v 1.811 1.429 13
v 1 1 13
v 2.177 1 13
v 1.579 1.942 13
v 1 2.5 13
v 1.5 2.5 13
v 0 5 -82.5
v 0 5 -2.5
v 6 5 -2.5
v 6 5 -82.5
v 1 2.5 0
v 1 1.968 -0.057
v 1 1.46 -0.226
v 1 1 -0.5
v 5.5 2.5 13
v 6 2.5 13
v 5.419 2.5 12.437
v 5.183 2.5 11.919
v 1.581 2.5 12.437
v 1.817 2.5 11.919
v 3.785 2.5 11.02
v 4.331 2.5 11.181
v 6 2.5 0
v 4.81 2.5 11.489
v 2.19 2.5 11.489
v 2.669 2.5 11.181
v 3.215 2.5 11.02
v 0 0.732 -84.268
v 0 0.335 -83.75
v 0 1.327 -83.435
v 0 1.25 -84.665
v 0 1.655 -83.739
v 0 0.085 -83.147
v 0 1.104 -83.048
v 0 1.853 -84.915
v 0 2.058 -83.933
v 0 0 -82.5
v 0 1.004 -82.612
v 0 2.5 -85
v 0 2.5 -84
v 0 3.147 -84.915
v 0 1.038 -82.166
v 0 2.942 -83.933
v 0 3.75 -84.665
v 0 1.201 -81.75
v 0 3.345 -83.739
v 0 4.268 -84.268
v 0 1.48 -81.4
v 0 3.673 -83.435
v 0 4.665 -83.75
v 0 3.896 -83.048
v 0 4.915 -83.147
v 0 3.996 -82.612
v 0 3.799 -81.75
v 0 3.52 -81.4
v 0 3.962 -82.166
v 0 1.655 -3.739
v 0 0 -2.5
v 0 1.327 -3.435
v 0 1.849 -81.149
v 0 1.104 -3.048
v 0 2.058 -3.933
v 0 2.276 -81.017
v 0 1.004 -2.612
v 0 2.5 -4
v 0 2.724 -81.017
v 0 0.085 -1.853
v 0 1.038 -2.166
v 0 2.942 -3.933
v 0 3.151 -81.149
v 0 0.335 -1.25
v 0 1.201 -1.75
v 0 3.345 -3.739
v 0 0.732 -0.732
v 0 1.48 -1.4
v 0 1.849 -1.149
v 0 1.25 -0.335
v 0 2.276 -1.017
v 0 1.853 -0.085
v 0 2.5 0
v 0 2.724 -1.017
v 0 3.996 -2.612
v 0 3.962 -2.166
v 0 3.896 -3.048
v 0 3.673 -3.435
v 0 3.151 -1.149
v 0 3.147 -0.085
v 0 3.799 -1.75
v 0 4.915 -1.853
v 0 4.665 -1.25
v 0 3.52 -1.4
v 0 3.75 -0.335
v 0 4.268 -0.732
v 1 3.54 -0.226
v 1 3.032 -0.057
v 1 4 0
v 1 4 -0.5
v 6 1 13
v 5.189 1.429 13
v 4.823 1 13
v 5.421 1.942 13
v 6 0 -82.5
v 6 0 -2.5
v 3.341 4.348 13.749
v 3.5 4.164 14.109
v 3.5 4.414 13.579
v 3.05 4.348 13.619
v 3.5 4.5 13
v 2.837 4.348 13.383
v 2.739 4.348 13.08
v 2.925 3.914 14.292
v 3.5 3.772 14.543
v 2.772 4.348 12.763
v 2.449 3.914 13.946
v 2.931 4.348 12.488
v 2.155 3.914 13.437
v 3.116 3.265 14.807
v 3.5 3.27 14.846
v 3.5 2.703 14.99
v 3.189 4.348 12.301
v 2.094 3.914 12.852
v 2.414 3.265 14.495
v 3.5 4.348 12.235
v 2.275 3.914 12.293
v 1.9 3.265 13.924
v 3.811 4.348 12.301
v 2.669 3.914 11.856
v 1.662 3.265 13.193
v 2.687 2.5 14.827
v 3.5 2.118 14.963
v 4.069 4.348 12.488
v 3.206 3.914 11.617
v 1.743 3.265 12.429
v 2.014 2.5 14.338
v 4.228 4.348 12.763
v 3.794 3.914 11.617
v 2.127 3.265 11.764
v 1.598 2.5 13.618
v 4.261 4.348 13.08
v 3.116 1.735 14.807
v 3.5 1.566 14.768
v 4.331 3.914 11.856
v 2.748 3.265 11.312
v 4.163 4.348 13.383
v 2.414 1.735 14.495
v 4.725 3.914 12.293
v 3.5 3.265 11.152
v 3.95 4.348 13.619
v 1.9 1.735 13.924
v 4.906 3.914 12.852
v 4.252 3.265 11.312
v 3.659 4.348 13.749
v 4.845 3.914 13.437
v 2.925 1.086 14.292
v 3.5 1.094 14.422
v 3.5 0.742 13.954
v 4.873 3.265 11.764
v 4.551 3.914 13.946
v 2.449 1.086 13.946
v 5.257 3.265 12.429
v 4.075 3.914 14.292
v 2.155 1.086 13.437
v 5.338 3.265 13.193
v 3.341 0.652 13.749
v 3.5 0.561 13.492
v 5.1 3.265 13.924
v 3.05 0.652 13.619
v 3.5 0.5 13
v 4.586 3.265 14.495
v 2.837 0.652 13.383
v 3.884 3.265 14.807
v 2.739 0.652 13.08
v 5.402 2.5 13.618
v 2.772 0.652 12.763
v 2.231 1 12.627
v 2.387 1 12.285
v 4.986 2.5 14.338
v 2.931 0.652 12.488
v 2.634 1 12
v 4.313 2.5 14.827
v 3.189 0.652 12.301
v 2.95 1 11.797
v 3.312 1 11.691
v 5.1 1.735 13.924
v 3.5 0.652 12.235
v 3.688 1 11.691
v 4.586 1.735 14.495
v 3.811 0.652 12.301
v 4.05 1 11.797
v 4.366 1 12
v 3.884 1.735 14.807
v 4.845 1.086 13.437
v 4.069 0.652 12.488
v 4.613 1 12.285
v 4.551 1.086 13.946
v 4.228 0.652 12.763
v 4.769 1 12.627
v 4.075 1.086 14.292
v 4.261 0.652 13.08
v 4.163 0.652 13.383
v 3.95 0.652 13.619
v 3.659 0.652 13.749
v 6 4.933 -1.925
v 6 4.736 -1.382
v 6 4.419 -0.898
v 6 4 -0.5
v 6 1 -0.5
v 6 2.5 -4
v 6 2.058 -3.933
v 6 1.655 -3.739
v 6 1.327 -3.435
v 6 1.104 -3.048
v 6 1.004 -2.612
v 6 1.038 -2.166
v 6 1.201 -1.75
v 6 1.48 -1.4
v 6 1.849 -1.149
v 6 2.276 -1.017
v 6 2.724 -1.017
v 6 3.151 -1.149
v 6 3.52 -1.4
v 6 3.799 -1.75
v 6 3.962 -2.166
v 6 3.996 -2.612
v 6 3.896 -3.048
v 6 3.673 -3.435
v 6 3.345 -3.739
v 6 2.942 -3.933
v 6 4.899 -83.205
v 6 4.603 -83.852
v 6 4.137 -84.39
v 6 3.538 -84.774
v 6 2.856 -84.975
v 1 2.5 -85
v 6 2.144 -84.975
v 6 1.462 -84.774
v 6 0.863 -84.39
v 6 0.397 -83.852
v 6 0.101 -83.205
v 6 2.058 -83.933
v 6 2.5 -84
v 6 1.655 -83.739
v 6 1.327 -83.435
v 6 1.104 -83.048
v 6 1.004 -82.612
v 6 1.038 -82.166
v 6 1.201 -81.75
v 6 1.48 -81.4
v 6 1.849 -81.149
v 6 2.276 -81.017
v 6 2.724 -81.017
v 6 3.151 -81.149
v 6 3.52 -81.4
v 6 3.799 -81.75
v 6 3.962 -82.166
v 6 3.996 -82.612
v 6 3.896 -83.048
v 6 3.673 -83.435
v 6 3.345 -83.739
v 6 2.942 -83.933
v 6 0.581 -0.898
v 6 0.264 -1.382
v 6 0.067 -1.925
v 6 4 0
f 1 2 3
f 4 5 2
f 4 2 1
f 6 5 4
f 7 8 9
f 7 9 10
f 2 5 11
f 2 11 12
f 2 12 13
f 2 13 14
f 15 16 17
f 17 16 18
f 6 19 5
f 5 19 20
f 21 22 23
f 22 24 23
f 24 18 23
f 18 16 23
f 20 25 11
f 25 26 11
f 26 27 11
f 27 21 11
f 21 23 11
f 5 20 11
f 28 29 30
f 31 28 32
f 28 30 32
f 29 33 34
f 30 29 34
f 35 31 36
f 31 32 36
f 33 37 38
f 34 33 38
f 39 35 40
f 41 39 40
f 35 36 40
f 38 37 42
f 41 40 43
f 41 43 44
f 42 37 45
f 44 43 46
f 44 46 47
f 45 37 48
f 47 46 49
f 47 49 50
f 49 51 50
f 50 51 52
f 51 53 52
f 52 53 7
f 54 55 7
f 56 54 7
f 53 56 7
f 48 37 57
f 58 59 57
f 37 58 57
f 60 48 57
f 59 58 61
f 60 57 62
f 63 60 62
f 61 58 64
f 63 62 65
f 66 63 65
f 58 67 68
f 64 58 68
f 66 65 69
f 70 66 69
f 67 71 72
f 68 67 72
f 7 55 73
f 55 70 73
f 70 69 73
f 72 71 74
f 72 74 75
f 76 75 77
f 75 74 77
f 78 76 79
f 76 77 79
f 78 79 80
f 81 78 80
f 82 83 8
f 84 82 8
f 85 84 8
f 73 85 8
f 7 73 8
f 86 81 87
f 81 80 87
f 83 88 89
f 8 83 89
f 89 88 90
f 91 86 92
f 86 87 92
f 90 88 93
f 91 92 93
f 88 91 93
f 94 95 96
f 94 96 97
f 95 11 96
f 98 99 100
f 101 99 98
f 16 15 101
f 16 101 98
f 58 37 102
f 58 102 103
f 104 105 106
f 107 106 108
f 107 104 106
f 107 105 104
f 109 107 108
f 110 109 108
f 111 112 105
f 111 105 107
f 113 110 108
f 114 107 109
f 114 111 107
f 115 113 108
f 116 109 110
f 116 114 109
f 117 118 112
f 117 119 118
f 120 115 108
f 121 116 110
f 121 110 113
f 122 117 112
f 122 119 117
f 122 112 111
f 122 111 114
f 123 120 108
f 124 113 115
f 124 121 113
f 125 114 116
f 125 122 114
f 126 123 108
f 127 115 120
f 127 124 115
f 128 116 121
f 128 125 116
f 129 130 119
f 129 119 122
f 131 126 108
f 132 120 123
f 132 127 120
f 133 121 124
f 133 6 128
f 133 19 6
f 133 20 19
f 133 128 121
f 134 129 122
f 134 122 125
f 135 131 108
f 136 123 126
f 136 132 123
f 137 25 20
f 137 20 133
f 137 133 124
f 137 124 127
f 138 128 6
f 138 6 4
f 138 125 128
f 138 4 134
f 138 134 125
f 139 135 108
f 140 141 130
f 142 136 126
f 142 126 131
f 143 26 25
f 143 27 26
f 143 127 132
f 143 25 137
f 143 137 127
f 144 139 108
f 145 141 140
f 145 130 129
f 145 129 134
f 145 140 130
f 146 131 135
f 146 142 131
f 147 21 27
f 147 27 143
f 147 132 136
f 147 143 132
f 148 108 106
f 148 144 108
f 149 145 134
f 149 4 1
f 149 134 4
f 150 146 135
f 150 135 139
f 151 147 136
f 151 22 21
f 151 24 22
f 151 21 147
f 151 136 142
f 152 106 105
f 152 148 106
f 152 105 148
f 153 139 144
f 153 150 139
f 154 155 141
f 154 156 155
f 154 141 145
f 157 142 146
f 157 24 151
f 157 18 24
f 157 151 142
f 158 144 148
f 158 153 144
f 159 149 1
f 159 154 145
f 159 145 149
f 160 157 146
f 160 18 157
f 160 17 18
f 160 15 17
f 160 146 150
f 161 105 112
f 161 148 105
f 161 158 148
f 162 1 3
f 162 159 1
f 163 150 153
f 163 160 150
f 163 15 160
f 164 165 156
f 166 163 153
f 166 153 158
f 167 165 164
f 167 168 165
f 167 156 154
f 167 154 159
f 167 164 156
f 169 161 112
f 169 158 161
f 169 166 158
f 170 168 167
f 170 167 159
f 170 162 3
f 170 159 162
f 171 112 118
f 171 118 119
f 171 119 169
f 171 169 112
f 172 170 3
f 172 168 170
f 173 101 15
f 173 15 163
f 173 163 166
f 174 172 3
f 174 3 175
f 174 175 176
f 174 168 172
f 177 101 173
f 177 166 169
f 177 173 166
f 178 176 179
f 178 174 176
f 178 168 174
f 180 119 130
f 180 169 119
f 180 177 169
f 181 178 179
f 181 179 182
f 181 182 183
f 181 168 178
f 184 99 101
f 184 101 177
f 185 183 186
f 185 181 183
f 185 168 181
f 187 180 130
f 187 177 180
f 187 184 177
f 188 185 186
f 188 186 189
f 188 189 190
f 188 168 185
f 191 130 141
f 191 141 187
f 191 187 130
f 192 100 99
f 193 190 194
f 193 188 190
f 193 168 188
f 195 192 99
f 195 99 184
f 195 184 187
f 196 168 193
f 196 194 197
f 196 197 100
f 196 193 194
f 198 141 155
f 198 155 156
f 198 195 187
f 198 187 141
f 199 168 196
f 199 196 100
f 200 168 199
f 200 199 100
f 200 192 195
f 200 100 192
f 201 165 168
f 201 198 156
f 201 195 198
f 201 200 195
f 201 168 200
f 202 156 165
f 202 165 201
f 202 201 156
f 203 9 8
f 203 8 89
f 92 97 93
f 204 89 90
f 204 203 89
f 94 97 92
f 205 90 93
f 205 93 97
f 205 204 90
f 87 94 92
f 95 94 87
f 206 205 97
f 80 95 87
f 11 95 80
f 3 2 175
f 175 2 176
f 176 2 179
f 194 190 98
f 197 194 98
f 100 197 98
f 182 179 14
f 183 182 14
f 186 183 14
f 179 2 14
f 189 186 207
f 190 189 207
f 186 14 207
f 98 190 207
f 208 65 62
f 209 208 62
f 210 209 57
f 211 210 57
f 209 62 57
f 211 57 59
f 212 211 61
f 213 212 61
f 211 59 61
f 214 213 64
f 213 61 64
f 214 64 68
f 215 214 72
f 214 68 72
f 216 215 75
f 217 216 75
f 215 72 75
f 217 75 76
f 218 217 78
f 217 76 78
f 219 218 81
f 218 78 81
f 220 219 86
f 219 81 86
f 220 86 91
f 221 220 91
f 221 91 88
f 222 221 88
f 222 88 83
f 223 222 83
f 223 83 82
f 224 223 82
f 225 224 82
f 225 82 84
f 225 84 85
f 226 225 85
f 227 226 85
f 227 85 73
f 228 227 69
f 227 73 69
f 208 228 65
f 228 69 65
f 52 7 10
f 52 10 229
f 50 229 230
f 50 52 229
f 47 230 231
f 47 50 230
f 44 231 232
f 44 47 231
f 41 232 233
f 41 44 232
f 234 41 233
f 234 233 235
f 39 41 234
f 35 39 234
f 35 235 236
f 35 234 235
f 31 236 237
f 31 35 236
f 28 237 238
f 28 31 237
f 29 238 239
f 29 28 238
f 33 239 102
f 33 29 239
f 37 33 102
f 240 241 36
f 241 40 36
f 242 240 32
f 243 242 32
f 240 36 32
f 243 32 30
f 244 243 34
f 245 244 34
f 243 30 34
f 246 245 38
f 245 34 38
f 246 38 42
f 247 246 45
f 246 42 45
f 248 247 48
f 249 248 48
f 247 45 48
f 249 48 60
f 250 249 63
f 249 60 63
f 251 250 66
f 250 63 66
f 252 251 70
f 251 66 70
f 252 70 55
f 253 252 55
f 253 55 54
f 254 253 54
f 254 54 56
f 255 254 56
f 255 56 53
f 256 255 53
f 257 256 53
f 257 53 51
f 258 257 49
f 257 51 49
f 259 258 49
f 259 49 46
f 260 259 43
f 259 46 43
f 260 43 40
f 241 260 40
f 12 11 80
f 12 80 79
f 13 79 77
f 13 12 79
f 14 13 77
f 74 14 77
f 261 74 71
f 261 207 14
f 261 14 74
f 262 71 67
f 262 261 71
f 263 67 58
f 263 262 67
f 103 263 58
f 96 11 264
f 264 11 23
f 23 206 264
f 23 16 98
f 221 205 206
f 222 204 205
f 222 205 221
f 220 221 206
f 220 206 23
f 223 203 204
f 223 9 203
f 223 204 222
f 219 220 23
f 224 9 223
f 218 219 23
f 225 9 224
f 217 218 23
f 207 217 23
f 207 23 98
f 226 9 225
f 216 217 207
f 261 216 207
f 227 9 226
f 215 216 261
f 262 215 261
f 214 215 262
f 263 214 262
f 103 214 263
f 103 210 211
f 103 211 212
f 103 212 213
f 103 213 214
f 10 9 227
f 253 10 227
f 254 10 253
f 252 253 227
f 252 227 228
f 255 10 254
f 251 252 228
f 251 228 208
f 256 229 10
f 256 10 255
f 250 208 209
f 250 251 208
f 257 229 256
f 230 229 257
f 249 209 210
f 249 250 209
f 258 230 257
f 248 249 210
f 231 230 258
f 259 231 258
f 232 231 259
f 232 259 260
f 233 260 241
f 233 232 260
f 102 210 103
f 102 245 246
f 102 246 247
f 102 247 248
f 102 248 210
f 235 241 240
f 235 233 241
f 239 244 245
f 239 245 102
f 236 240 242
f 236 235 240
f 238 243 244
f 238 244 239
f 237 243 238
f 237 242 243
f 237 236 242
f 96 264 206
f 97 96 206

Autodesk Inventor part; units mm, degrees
sketch "草圖1" plane through (0, 0, 0) normal (1, 0, 0) x (0, 1, 0)
  line L0 (0, 0) -> (5, 0)
  line L1 (5, 0) -> (5, -85)
  line L2 (5, -85) -> (0, -85)
  line L3 (0, -85) -> (0, 0)
  dimension "d0" = 5
  dimension "d1" = 85
extrude "擠出1" add sketch "草圖1" along normal blind 6
fillet "圓角1" radius 2.5 2 edges at (3, 5, 0) (3, 0, 0)
hole "孔1" at (6, 2.5, -2.5) direction (-1, 0, 0) diameter 3 end through all
fillet "圓角2" radius 2.5 2 edges at (3, 5, -85) (3, 0, -85)
hole "孔2" at (6, 2.5, -82.5) direction (-1, 0, 0) diameter 3 end through all
sketch "草圖2" plane through (6, 0, 0) normal (1, 0, 0) x (0, 0, -1)
  line L0 (0, -1) -> (0, 6) projected
  line L1 (0, -1) -> (0, 6) projected
  line L2 (120, 0) -> (-20, 0) projected
  circle A0 centre (82.5, 2.5) radius 1.5 projected
  circle A1 centre (2.5, 2.5) radius 1.5 projected
  arc A2 (82.5, 0) -> (82.5, 5) centre (82.5, 2.5) ccw projected
  line L3 (82.5, 5) -> (2.5, 5) projected
  arc A3 (2.5, 5) -> (2.5, 0) centre (2.5, 2.5) ccw projected
  line L4 (2.5, 0) -> (82.5, 0) projected
  circle A4 centre (98.5, 2.5) radius 1.5
  circle A5 centre (82.5, 2.5) radius 1.5 projected
  line L5 (84.5, 4) -> (98.5, 4)
  line L6 (98.5, 4) -> (98.5, 1)
  line L7 (98.5, 1) -> (84.5, 1)
  point P0 (0, 0)
  dimension "d24" = 3
  dimension "d25" = 16
extrude "擠出2" add sketch "草圖2" against normal blind 5 contours A2 L5 A4 L7 | L6 A4 | A4 L6
ref_plane "工作平面1" through (3, 0, 0) normal (1, 0, 0) x (0, 0, -1)
sketch "草圖3" plane through (3, 0, 0) normal (1, 0, 0) x (0, 0, -1)
  arc A0 (98.5, 1) -> (98.5, 4) centre (98.5, 2.5) ccw projected
  line L0 (98.5, 1) -> (102.8586, 1)
  line L1 (102.8586, 1) -> (102.8586, 5.3685)
  line L2 (102.8586, 5.3685) -> (98.5, 5.3685)
  line L3 (98.5, 5.3685) -> (98.5, 1)
  point P0 (0, 0)
extrude "擠出3" cut sketch "草圖3" along normal mid plane 6
sketch "草圖4" plane through (3, 0, 0) normal (1, 0, 0) x (0, 0, -1)
  line L0 (98.5, 4) -> (98.5, 1) projected
  arc A0 (98.5, 0) -> (98.5, 5) centre (98.5, 2.5) ccw
  line L1 (98.5, 5) -> (98.5, 0)
  point P0 (0, 0)
  dimension "d30" = 5
revolve "迴轉1" add sketch "草圖4" angle 360 about axis through (3, 5, -98.5) along (0, -1, 0)
ref_plane "工作平面3" through (-79.3581, 2.5, -42.5) normal (0, 0, 1) x (1, 0, 0)
ref_plane "工作平面2" through (-79.3581, 2.5, -2.5) normal (0, 0, 1) x (1, 0, 0)
mirror "鏡射1" about plane through (-79.3581, 2.5, -42.5) normal (0, 0, 1) of "迴轉1", "擠出2", "擠出3"
sketch "草圖5" plane through (0, 0, 0) normal (-1, 0, 0) x (0, 0, 1)
  circle A0 centre (-82.5, 2.5) radius 1.5 projected
  arc A1 (-82.5, 5) -> (-82.5, 0) centre (-82.5, 2.5) ccw projected
  line L0 (-82.5, 0) -> (-2.5, 0) projected
  arc A2 (-2.5, 0) -> (-2.5, 5) centre (-2.5, 2.5) ccw projected
  line L1 (-2.5, 5) -> (-82.5, 5) projected
  circle A3 centre (-2.5, 2.5) radius 1.5 projected
  line L2 (-82.5, 0) -> (-111.7443, 0)
  line L3 (-111.7443, 0) -> (-111.7443, 9.7981)
  line L4 (-111.7443, 9.7981) -> (-82.5, 9.7981)
  line L5 (-82.5, 9.7981) -> (-82.5, 5)
  point P0 (0, 0)
extrude "擠出4" cut sketch "草圖5" against normal blind 68 contours A1 L2 L3 L4 L5
sketch "草圖6" plane through (6, 4, 13.5) normal (0, 1, 0) x (1, 0, 0)
  line L0 (-5, 14) -> (-5, 0) projected
  line L1 (0, 14) -> (0, 0) projected
  line L2 (-5, 3.7503) -> (0, 3.7503)
  line L3 (0, 3.7503) -> (0, 5.4836)
  line L4 (0, 5.4836) -> (-5, 5.4836)
  line L5 (-5, 5.4836) -> (-5, 3.7503)
  line L6 (-6, 13.5) -> (3.0826, 13.5)
  line L7 (3.0826, 13.5) -> (3.0826, -5.8508)
  line L8 (3.0826, -5.8508) -> (-6, -5.8508)
  line L9 (-6, -5.8508) -> (-6, 13.5)
  dimension "d36" = 1.7333
extrude "擠出5" cut sketch "草圖6" along normal mid plane 34.75 contours L0 L2 L1 L6 L7 L8 L9 | L0 L6 L1 L4
sketch "草圖7" plane through (1, 4, 9.7497) normal (0, 1, 0) x (1, 0, 0)
  line L0 (6.9259, 3.5729) -> (-0.7883, 3.5729)
  line L1 (-0.7883, 3.5729) -> (-0.7883, -1.5637)
  line L2 (-0.7883, -1.5637) -> (6.9259, -1.5637)
  line L3 (6.9259, -1.5637) -> (6.9259, 3.5729)
  point P0 (-1, 9.7497)
extrude "擠出6" cut sketch "草圖7" against normal blind 68.5
sketch "草圖8" plane through (1, 4, 0) normal (0, 0, 1) x (1, 0, 0)
  line L0 (0, -1.5) -> (0, -3) projected
  line L1 (5, 0) -> (5, -3) projected
  line L2 (0, -3) -> (5, -3)
  line L3 (5, -3) -> (5, -1.5)
  line L4 (5, -1.5) -> (0, -1.5)
  line L5 (0, -1.5) -> (0, -3)
  point P0 (-1, -4)
extrude "擠出7" add sketch "草圖8" along normal blind 13
ref_plane "工作平面5" through (3.5, 0, 0) normal (1, 0, 0) x (0, 0, -1)
sketch "草圖10" plane through (3.5, 0, 0) normal (1, 0, 0) x (0, 0, -1)
  line L0 (-13, 2.5) -> (-13, 1) projected
  arc A0 (-13, 4.5) -> (-13, 0.5) centre (-13, 2.5) ccw
  line L1 (-13, 4.5) -> (-13, 0.5)
  point P0 (0, 0)
  dimension "d45" = 4
revolve "迴轉3" add sketch "草圖10" angle 360 about axis through (3.5, 4.5, 13) along (0, -1, 0)
ref_plane "工作平面4" through (3, 0, -85) normal (-1, 0, 0) x (0, 0, 1)
properties part number "支架4-9"
